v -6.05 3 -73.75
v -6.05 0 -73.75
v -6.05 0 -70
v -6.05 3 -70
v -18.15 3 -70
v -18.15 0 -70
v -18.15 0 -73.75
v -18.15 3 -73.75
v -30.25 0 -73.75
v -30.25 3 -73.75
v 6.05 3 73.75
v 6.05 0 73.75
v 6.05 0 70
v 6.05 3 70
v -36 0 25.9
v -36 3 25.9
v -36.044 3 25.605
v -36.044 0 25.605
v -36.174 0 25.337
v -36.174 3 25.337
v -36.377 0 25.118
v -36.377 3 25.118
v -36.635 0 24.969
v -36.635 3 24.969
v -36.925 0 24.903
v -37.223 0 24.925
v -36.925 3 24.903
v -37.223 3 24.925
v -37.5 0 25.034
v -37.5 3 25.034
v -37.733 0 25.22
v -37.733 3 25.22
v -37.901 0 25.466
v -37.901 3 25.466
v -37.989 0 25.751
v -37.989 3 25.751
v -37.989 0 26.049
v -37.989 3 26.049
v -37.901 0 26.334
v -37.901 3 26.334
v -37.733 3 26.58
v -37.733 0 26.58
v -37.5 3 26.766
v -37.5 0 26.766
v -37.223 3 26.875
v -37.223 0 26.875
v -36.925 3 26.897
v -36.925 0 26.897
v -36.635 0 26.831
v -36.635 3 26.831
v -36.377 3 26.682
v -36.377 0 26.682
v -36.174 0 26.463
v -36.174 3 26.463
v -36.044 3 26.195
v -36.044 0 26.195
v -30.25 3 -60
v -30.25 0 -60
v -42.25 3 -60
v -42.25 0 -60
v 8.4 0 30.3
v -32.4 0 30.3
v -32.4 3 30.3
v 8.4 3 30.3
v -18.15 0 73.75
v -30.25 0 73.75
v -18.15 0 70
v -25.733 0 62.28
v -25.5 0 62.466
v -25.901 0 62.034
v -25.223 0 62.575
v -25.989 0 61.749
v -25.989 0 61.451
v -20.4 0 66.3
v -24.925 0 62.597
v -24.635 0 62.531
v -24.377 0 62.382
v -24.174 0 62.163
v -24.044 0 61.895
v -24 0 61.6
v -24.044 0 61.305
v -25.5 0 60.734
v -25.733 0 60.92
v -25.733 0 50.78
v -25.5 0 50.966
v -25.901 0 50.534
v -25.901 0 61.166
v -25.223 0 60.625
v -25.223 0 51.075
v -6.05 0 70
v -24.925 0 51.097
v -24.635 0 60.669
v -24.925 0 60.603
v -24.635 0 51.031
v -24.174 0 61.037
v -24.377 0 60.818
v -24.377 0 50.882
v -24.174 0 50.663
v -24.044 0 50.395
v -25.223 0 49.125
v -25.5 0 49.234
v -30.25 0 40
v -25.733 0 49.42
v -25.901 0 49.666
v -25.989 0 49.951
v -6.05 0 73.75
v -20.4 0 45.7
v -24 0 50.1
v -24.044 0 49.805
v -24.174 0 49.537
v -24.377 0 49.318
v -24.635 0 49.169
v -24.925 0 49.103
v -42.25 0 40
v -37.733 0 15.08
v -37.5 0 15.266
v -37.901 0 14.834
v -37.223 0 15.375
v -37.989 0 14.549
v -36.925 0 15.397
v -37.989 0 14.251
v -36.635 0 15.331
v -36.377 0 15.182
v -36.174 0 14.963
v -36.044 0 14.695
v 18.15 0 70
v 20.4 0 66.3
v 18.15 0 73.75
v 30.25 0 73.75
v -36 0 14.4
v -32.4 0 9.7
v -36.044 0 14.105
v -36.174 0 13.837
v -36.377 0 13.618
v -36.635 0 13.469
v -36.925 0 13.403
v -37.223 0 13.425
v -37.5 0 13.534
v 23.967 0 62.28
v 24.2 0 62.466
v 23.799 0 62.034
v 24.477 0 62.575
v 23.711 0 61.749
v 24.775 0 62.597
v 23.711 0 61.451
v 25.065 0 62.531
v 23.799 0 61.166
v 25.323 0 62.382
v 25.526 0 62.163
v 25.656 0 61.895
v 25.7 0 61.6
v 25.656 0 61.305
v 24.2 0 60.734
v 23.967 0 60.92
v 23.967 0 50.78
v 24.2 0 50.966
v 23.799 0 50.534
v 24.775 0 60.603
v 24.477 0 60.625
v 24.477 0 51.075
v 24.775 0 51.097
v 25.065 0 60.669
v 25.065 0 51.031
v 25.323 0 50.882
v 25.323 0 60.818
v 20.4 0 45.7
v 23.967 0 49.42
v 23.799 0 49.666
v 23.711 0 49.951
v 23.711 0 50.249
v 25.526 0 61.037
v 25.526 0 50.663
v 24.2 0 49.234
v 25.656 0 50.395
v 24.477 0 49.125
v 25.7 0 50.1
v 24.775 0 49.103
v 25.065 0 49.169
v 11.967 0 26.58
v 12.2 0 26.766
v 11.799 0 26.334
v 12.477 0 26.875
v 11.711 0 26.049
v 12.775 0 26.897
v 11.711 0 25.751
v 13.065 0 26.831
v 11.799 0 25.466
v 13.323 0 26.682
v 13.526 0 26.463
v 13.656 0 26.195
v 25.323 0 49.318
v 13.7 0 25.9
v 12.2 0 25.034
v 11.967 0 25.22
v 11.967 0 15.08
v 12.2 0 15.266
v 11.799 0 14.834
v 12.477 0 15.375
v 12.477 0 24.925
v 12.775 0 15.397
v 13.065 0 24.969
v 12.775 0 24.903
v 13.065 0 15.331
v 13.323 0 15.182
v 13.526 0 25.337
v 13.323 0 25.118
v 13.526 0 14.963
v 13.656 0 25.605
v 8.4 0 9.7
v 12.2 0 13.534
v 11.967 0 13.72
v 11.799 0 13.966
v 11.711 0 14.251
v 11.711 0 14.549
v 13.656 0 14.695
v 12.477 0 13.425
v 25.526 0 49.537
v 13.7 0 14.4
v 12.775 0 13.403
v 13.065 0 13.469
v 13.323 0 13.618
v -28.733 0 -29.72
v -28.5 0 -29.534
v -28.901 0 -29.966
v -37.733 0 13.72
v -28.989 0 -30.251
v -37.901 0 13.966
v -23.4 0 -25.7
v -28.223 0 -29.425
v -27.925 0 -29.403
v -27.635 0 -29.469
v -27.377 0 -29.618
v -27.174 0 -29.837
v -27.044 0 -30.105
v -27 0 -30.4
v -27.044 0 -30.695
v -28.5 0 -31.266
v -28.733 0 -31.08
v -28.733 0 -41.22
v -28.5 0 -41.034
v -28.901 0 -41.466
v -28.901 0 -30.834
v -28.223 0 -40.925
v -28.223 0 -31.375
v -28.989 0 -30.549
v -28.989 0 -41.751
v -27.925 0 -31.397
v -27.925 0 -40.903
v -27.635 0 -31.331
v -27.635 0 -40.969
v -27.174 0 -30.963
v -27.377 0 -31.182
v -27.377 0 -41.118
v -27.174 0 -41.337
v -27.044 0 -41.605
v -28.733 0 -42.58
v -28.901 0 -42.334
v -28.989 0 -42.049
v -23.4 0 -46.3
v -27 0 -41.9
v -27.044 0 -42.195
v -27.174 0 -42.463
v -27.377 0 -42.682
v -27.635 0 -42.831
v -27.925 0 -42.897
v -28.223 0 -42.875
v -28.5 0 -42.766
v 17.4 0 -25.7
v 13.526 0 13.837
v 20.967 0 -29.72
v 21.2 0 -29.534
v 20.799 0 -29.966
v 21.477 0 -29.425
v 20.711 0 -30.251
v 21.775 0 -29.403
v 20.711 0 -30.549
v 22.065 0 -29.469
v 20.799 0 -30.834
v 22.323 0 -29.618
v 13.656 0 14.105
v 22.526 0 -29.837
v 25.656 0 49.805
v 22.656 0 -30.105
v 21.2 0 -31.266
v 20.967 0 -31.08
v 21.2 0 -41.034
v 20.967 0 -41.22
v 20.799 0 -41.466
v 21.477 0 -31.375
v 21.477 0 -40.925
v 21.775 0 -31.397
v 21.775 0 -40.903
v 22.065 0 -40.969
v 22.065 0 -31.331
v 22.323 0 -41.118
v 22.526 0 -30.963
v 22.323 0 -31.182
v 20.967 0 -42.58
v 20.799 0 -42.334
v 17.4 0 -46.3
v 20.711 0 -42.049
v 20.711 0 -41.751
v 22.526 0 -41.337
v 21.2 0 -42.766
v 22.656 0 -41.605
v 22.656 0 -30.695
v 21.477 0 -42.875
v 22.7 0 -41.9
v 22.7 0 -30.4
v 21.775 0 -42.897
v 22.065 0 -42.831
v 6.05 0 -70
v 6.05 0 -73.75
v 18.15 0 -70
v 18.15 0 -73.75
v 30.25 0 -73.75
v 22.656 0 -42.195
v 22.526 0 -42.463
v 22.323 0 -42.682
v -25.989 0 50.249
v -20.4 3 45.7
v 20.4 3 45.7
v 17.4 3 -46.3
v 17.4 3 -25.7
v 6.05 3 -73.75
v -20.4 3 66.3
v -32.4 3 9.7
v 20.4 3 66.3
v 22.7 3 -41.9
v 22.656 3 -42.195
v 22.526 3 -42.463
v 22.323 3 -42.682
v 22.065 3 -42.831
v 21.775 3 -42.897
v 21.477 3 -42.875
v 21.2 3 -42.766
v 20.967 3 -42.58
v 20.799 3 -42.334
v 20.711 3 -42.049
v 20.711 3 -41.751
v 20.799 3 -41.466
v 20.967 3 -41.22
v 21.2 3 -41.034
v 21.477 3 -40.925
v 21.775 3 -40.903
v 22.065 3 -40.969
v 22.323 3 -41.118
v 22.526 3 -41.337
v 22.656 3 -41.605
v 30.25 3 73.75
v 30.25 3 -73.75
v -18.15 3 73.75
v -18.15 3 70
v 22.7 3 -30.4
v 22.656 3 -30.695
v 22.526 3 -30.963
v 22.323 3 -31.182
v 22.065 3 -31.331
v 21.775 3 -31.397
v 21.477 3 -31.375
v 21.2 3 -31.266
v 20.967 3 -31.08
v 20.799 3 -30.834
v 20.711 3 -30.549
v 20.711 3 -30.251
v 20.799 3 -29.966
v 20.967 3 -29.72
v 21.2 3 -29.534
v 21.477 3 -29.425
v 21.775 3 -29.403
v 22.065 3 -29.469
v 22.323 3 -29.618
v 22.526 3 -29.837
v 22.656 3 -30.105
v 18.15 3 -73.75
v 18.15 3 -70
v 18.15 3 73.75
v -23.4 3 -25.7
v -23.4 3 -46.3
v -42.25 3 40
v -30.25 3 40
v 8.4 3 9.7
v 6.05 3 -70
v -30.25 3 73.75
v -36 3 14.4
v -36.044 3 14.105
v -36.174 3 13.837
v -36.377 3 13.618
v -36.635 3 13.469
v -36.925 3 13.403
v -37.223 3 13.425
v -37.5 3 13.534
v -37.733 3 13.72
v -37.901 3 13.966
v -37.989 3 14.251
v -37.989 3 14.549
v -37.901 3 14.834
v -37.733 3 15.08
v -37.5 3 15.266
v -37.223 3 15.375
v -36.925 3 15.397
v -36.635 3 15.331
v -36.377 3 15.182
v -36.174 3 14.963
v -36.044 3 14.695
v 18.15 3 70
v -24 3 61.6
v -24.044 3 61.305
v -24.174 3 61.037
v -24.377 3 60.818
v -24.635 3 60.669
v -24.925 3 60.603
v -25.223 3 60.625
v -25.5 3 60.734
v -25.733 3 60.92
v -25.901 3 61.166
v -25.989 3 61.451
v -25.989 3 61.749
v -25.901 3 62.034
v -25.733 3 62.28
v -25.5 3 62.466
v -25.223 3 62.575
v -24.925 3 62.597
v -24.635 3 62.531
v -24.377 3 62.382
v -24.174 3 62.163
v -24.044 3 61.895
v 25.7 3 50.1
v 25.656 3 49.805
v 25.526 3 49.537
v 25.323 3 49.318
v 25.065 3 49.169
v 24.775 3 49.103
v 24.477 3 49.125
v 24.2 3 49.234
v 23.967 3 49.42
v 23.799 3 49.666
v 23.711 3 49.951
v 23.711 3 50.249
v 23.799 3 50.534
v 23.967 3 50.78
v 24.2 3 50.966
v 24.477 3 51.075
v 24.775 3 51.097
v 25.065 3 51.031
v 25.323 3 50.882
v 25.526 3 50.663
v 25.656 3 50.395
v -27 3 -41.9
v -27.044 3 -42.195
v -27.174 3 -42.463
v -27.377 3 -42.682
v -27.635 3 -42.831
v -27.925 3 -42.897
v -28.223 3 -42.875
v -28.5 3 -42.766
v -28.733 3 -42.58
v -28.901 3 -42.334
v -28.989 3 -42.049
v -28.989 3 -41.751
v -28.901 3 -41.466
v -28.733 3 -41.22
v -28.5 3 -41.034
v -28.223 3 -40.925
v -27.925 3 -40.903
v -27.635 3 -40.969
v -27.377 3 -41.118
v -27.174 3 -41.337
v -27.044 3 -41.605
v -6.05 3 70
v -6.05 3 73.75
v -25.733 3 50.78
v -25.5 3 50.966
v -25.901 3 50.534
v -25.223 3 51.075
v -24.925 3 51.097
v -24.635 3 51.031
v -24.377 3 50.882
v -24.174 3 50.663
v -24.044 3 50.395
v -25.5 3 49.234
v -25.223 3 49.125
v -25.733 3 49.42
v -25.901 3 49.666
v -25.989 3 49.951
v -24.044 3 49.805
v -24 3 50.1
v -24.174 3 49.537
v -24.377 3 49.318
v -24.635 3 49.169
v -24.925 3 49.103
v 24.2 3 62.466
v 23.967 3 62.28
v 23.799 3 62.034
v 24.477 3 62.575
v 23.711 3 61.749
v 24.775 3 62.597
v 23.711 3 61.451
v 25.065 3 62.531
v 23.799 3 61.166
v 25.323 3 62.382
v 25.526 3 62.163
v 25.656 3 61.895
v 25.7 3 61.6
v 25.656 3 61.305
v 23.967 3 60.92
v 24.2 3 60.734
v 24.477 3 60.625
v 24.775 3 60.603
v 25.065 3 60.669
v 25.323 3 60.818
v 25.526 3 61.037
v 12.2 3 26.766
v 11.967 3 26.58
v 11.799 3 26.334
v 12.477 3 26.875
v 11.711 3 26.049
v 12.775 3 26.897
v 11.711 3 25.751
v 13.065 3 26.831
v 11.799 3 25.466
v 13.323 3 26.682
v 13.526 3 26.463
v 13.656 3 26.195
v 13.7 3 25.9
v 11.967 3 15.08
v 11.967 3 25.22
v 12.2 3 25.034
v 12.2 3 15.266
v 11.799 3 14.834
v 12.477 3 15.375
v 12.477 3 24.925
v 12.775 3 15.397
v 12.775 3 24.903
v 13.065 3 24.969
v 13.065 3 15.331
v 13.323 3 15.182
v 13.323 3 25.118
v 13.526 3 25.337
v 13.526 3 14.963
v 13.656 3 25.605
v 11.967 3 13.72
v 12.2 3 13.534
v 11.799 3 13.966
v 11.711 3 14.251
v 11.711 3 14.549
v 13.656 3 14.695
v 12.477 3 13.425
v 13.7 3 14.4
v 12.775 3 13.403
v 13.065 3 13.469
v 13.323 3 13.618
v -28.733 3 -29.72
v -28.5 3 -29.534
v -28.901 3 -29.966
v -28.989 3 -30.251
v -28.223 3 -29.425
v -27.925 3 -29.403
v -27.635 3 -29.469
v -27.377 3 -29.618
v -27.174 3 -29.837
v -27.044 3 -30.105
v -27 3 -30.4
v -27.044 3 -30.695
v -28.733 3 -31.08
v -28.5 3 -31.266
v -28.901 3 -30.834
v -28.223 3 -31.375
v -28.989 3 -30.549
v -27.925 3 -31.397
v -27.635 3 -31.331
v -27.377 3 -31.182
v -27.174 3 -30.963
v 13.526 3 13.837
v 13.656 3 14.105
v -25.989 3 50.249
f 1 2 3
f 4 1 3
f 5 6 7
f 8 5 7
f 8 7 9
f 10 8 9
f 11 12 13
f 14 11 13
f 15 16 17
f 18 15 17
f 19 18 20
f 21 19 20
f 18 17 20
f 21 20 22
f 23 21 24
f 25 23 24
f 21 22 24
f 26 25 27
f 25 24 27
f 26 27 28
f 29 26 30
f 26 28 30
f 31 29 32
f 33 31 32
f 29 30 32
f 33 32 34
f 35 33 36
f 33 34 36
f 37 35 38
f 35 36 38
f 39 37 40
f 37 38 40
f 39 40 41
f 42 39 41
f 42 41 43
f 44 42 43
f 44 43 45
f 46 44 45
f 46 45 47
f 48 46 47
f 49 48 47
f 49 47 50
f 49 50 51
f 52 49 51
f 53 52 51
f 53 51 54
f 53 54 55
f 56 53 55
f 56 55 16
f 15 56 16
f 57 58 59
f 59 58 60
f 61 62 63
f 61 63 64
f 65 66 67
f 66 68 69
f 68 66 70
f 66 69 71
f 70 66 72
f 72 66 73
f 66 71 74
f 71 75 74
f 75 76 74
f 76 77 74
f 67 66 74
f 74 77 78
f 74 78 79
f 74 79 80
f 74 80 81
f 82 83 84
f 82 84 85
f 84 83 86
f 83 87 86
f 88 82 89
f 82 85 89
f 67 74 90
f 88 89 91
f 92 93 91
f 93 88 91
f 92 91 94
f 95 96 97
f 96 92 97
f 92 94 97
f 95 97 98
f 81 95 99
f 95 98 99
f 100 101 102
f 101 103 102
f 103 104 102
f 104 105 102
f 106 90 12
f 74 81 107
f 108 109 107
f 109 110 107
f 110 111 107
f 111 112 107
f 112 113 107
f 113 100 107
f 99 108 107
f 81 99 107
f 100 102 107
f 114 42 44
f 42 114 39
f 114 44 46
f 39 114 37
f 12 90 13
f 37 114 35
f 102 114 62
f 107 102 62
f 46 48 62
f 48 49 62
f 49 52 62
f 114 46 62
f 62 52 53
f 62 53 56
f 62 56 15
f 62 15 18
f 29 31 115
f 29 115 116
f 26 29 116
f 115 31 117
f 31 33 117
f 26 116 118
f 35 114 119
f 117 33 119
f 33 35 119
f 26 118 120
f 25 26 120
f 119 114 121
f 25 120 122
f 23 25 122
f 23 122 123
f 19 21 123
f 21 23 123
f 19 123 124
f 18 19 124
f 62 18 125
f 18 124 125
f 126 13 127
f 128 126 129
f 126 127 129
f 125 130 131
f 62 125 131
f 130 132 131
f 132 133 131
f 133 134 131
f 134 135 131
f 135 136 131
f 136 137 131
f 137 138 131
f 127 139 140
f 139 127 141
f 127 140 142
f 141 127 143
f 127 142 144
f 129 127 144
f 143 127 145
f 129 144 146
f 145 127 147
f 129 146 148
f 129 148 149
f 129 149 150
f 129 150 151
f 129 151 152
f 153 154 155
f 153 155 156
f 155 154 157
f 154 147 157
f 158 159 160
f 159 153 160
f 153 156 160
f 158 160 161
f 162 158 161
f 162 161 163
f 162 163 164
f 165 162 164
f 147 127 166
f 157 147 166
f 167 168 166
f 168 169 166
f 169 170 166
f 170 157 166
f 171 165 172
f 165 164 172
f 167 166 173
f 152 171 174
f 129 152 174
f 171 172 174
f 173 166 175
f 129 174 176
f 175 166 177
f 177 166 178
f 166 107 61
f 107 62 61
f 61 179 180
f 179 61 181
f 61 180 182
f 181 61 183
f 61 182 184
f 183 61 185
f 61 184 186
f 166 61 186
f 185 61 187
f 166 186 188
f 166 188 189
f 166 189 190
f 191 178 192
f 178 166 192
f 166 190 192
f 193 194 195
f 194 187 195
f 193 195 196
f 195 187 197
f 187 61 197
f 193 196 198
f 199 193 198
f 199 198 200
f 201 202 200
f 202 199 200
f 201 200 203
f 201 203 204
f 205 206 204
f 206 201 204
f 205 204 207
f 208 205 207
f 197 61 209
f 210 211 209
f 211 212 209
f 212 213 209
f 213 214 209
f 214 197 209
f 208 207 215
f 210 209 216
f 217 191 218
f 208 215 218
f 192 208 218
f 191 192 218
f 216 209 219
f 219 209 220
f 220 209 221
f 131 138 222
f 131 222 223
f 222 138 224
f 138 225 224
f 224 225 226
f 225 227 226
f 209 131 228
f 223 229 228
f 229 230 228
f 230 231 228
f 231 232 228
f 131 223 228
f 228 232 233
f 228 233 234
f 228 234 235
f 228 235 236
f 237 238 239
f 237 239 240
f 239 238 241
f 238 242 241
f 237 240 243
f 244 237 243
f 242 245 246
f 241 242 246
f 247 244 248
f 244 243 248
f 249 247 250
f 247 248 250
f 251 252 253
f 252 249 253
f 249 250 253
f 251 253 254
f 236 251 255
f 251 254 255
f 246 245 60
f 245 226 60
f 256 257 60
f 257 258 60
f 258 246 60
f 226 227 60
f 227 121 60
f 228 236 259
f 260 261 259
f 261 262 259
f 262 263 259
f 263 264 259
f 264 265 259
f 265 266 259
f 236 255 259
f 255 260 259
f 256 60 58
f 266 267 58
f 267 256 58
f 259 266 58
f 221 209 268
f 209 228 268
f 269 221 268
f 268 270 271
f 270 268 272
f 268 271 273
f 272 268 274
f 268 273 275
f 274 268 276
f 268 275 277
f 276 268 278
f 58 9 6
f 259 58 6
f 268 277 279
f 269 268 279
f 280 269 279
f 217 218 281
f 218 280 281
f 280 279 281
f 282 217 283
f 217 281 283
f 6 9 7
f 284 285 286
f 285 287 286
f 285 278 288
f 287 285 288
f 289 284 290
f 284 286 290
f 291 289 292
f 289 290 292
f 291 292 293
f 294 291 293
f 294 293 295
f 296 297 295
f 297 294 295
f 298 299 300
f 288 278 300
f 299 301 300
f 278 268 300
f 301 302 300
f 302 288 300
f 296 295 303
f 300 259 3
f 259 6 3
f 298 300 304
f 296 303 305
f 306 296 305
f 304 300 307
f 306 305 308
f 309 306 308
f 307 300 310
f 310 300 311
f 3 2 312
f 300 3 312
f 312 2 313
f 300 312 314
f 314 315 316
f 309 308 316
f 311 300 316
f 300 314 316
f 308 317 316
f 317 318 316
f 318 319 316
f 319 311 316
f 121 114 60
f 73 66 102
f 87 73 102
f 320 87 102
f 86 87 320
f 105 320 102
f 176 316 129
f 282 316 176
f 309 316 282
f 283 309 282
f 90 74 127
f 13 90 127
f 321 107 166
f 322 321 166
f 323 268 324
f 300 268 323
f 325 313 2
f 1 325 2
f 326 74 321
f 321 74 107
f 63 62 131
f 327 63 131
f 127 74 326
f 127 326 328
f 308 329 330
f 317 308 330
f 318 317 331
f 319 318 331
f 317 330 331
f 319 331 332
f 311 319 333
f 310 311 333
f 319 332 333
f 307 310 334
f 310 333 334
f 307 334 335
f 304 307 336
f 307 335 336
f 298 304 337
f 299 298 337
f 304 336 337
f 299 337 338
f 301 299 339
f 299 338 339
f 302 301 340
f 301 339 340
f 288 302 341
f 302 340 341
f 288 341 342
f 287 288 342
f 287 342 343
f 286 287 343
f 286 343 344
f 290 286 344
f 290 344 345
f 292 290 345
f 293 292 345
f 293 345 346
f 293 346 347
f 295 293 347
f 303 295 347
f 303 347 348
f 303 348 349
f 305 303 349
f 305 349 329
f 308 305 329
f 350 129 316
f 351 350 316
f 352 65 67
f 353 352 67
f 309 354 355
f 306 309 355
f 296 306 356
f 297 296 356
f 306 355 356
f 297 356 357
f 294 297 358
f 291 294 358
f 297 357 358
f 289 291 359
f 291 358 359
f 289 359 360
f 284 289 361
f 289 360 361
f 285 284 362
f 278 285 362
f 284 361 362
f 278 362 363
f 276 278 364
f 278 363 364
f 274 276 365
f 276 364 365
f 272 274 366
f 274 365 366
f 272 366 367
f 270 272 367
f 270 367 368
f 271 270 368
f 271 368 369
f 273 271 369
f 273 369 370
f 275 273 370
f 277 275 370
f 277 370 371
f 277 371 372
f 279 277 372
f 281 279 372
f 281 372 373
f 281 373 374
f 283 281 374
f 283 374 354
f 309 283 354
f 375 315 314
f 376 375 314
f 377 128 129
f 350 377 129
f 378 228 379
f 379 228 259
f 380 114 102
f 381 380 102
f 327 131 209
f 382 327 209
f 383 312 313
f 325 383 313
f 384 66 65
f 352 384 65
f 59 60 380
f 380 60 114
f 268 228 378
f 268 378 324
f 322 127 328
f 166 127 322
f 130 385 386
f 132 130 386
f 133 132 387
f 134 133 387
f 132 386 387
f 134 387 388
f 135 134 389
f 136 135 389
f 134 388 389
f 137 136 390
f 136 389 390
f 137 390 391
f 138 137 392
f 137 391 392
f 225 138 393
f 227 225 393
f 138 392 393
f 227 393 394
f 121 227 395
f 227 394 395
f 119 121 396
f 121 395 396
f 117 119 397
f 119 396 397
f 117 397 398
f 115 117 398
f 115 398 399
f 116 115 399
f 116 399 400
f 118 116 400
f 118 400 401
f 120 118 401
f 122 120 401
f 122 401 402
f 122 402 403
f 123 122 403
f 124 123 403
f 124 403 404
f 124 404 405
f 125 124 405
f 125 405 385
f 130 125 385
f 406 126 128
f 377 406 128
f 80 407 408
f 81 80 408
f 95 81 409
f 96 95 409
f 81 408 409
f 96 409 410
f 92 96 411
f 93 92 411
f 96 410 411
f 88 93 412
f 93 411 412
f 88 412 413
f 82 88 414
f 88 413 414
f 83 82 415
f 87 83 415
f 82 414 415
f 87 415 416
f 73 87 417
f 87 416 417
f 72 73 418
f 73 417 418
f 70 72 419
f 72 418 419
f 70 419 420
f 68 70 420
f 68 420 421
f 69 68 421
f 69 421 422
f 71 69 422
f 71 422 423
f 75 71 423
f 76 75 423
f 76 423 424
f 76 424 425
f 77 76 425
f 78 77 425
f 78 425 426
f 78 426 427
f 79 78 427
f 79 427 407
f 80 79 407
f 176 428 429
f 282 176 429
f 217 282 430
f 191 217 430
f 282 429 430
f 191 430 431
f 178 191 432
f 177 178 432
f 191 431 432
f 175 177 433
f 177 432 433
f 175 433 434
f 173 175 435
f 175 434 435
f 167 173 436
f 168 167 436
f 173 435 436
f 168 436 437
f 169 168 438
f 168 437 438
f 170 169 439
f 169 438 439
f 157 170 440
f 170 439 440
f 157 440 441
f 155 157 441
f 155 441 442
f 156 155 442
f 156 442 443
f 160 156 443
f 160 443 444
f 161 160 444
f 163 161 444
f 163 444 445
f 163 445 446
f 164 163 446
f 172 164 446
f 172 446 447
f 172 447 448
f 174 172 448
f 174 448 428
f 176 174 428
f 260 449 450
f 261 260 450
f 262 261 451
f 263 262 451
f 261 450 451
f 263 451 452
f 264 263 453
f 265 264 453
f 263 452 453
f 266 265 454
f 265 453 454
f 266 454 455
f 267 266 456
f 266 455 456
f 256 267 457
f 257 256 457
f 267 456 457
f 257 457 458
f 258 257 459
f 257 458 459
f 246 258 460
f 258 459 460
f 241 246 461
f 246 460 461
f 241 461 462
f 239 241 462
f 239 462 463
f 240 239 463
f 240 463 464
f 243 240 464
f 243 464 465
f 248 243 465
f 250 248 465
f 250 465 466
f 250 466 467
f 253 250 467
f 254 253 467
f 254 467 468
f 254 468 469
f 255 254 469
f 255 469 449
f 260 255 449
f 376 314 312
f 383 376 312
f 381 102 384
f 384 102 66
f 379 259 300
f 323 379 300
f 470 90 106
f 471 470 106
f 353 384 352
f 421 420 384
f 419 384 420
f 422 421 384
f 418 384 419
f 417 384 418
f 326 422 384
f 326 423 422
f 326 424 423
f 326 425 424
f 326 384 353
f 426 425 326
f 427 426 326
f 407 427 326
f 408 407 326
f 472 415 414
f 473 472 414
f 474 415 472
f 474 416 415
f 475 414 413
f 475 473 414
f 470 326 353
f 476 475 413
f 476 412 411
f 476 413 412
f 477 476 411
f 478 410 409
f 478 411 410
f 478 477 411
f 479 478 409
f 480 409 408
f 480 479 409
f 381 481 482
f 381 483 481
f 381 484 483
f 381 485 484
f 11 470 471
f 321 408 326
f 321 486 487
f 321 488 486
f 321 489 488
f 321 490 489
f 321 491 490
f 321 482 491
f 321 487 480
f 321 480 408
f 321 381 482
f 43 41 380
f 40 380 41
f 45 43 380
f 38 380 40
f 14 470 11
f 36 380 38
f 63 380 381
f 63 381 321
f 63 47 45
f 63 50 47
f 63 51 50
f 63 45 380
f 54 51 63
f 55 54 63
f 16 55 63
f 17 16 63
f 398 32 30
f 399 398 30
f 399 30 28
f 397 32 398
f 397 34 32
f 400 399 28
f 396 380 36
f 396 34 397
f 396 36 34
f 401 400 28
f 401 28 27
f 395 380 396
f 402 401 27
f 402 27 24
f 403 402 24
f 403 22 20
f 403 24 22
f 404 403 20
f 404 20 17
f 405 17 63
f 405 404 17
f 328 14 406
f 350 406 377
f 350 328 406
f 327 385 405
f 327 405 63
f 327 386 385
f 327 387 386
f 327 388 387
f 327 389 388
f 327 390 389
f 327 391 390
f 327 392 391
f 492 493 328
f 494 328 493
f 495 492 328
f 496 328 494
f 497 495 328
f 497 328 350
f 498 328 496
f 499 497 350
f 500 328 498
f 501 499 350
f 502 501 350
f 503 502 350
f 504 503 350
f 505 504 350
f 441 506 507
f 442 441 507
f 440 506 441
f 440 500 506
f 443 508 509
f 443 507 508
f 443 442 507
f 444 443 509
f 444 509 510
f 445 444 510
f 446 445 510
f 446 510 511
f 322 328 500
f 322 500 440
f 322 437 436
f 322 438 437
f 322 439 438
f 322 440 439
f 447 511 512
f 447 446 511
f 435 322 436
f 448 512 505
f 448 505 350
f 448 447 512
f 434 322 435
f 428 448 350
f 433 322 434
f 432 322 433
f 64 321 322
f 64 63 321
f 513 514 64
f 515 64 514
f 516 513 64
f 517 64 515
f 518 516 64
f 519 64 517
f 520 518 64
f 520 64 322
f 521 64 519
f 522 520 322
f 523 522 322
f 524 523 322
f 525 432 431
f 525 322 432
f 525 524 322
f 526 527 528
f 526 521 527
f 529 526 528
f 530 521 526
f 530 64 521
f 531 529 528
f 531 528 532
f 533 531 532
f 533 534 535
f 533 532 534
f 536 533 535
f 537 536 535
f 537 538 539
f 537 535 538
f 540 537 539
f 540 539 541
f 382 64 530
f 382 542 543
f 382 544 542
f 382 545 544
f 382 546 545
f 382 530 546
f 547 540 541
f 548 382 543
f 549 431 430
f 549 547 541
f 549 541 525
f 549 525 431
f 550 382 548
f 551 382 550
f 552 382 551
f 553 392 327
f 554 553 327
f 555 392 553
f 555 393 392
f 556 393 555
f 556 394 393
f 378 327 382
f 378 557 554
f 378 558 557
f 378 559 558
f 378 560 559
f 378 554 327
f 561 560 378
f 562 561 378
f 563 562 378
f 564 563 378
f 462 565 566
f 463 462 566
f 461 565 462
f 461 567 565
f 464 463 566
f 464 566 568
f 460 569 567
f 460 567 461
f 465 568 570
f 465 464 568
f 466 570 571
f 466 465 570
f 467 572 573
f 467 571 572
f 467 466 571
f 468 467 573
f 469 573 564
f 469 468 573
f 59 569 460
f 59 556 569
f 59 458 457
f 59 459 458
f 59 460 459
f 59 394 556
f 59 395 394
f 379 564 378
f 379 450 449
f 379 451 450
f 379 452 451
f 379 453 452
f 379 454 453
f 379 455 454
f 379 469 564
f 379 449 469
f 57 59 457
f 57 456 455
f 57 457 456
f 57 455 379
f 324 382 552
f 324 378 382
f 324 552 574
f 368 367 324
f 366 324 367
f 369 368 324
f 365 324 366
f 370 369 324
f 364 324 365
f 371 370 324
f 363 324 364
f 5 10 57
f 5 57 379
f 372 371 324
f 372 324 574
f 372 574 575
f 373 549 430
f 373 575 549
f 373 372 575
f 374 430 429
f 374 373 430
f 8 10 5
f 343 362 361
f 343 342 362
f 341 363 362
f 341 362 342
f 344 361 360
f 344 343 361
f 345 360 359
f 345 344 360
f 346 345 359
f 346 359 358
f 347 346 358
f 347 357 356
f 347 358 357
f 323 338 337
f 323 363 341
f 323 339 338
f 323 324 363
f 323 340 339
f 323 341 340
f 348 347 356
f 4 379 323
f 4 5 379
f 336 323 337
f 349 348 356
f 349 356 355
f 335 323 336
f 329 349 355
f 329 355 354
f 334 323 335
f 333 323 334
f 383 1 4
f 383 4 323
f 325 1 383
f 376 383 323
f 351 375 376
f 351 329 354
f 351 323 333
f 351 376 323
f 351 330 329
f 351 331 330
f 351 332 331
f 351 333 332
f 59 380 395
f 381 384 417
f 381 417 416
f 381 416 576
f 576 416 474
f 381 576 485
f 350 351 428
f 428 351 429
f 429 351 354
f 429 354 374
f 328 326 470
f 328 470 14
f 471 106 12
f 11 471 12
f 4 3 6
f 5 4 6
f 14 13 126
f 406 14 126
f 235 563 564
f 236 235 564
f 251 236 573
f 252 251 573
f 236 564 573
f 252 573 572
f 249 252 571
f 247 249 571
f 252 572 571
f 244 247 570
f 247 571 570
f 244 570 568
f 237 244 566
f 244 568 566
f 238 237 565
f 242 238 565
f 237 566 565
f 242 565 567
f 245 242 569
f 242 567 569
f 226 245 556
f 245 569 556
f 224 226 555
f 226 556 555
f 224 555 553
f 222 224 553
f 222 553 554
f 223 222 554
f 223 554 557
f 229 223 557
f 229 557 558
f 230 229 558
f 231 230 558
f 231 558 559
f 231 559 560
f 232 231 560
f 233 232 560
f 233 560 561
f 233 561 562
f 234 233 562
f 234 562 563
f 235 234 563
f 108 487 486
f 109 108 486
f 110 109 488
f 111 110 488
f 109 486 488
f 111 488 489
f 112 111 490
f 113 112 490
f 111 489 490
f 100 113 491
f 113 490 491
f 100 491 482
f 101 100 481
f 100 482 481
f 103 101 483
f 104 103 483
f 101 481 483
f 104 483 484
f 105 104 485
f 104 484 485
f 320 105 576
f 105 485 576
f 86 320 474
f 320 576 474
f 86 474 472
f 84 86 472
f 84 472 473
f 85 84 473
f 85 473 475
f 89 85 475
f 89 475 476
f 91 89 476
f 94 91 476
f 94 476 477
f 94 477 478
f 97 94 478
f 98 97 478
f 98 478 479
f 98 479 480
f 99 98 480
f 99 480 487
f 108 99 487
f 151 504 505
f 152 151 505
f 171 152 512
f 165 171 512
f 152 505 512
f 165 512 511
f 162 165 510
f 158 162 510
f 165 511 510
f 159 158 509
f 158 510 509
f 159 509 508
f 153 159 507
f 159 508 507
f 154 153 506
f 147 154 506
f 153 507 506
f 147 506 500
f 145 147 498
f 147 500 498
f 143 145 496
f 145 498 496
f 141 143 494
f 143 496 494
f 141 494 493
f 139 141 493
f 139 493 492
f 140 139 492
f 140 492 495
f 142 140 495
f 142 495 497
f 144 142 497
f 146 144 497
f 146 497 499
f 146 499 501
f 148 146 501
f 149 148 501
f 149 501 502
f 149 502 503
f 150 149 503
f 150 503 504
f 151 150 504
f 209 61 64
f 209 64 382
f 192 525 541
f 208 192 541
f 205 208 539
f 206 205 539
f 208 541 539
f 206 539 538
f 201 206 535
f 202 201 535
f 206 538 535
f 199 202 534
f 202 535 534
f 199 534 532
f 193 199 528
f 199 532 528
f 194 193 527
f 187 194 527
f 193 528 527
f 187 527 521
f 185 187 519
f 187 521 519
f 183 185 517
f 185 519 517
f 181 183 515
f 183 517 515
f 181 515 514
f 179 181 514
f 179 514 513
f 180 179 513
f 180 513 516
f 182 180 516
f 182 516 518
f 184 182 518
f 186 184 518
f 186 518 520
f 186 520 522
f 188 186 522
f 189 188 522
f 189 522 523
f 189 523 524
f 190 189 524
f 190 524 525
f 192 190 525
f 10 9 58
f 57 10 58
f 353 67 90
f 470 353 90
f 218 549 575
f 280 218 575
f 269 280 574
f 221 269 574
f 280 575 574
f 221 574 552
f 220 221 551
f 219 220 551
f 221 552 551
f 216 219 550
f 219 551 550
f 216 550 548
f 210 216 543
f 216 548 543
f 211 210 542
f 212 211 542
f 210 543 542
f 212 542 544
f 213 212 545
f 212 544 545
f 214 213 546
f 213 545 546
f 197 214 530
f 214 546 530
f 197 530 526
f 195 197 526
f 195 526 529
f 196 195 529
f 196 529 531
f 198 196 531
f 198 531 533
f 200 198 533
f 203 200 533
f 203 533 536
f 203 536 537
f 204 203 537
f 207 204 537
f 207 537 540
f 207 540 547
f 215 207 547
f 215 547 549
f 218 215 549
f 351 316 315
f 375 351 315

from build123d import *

# Parameters (mm, degrees)
SKETCH1_W           = 40.8
SKETCH1_H           = 20.6
BOSS_EXTRUDE4_DEPTH = 3
SKETCH2_R           = 1
CUT_EXTRUDE1_DEPTH  = 4


with BuildPart() as part:
    # Sketch1 → Boss-Extrude4 (new body)
    with BuildSketch(Plane(origin=(0, 0, 0), x_dir=(1, 0, 0), z_dir=(0, 1, 0))):
        Polygon((30.25, -70), (30.25, 70), (30.25, 73.75), (18.15, 73.75), (18.15, 70), (6.05, 70), (6.05, 73.75), (-6.05, 73.75), (-6.05, 70), (-18.15, 70), (-18.15, 73.75), (-30.25, 73.75), (-30.25, 70), (-30.25, 60), (-42.25, 60), (-42.25, -40), (-30.25, -40), (-30.25, -70), (-30.25, -73.75), (-18.15, -73.75), (-18.15, -70), (-6.05, -70), (-6.05, -73.75), (6.05, -73.75), (6.05, -70), (18.15, -70), (18.15, -73.75), (30.25, -73.75), align=None)
        with Locations((0, -56)):
            Rectangle(SKETCH1_W, SKETCH1_H, mode=Mode.SUBTRACT)
        with Locations((-12, -20)):
            Rectangle(SKETCH1_W, SKETCH1_H, mode=Mode.SUBTRACT)
        with Locations((-3, 36)):
            Rectangle(SKETCH1_W, SKETCH1_H, mode=Mode.SUBTRACT)
    extrude(amount=BOSS_EXTRUDE4_DEPTH)

    # Sketch2 → Cut-Extrude1 (cut, through all)
    with BuildSketch(Plane(origin=(0, 3, 0), x_dir=(1, 0, 0), z_dir=(0, 1, 0))):
        with Locations((-25, -50.1)):
            Circle(SKETCH2_R)
        with Locations((-25, -61.6)):
            Circle(SKETCH2_R)
        with Locations((-37, -25.9)):
            Circle(SKETCH2_R)
        with Locations((-28, 30.4)):
            Circle(SKETCH2_R)
        with Locations((-28, 41.9)):
            Circle(SKETCH2_R)
        with Locations((21.7, 41.9)):
            Circle(SKETCH2_R)
        with Locations((21.7, 30.4)):
            Circle(SKETCH2_R)
        with Locations((12.7, -14.4)):
            Circle(SKETCH2_R)
        with Locations((12.7, -25.9)):
            Circle(SKETCH2_R)
        with Locations((24.7, -50.1)):
            Circle(SKETCH2_R)
        with Locations((24.7, -61.6)):
            Circle(SKETCH2_R)
        with Locations((-37, -14.4)):
            Circle(SKETCH2_R)
    extrude(amount=-CUT_EXTRUDE1_DEPTH, mode=Mode.SUBTRACT)


solid = part.part
